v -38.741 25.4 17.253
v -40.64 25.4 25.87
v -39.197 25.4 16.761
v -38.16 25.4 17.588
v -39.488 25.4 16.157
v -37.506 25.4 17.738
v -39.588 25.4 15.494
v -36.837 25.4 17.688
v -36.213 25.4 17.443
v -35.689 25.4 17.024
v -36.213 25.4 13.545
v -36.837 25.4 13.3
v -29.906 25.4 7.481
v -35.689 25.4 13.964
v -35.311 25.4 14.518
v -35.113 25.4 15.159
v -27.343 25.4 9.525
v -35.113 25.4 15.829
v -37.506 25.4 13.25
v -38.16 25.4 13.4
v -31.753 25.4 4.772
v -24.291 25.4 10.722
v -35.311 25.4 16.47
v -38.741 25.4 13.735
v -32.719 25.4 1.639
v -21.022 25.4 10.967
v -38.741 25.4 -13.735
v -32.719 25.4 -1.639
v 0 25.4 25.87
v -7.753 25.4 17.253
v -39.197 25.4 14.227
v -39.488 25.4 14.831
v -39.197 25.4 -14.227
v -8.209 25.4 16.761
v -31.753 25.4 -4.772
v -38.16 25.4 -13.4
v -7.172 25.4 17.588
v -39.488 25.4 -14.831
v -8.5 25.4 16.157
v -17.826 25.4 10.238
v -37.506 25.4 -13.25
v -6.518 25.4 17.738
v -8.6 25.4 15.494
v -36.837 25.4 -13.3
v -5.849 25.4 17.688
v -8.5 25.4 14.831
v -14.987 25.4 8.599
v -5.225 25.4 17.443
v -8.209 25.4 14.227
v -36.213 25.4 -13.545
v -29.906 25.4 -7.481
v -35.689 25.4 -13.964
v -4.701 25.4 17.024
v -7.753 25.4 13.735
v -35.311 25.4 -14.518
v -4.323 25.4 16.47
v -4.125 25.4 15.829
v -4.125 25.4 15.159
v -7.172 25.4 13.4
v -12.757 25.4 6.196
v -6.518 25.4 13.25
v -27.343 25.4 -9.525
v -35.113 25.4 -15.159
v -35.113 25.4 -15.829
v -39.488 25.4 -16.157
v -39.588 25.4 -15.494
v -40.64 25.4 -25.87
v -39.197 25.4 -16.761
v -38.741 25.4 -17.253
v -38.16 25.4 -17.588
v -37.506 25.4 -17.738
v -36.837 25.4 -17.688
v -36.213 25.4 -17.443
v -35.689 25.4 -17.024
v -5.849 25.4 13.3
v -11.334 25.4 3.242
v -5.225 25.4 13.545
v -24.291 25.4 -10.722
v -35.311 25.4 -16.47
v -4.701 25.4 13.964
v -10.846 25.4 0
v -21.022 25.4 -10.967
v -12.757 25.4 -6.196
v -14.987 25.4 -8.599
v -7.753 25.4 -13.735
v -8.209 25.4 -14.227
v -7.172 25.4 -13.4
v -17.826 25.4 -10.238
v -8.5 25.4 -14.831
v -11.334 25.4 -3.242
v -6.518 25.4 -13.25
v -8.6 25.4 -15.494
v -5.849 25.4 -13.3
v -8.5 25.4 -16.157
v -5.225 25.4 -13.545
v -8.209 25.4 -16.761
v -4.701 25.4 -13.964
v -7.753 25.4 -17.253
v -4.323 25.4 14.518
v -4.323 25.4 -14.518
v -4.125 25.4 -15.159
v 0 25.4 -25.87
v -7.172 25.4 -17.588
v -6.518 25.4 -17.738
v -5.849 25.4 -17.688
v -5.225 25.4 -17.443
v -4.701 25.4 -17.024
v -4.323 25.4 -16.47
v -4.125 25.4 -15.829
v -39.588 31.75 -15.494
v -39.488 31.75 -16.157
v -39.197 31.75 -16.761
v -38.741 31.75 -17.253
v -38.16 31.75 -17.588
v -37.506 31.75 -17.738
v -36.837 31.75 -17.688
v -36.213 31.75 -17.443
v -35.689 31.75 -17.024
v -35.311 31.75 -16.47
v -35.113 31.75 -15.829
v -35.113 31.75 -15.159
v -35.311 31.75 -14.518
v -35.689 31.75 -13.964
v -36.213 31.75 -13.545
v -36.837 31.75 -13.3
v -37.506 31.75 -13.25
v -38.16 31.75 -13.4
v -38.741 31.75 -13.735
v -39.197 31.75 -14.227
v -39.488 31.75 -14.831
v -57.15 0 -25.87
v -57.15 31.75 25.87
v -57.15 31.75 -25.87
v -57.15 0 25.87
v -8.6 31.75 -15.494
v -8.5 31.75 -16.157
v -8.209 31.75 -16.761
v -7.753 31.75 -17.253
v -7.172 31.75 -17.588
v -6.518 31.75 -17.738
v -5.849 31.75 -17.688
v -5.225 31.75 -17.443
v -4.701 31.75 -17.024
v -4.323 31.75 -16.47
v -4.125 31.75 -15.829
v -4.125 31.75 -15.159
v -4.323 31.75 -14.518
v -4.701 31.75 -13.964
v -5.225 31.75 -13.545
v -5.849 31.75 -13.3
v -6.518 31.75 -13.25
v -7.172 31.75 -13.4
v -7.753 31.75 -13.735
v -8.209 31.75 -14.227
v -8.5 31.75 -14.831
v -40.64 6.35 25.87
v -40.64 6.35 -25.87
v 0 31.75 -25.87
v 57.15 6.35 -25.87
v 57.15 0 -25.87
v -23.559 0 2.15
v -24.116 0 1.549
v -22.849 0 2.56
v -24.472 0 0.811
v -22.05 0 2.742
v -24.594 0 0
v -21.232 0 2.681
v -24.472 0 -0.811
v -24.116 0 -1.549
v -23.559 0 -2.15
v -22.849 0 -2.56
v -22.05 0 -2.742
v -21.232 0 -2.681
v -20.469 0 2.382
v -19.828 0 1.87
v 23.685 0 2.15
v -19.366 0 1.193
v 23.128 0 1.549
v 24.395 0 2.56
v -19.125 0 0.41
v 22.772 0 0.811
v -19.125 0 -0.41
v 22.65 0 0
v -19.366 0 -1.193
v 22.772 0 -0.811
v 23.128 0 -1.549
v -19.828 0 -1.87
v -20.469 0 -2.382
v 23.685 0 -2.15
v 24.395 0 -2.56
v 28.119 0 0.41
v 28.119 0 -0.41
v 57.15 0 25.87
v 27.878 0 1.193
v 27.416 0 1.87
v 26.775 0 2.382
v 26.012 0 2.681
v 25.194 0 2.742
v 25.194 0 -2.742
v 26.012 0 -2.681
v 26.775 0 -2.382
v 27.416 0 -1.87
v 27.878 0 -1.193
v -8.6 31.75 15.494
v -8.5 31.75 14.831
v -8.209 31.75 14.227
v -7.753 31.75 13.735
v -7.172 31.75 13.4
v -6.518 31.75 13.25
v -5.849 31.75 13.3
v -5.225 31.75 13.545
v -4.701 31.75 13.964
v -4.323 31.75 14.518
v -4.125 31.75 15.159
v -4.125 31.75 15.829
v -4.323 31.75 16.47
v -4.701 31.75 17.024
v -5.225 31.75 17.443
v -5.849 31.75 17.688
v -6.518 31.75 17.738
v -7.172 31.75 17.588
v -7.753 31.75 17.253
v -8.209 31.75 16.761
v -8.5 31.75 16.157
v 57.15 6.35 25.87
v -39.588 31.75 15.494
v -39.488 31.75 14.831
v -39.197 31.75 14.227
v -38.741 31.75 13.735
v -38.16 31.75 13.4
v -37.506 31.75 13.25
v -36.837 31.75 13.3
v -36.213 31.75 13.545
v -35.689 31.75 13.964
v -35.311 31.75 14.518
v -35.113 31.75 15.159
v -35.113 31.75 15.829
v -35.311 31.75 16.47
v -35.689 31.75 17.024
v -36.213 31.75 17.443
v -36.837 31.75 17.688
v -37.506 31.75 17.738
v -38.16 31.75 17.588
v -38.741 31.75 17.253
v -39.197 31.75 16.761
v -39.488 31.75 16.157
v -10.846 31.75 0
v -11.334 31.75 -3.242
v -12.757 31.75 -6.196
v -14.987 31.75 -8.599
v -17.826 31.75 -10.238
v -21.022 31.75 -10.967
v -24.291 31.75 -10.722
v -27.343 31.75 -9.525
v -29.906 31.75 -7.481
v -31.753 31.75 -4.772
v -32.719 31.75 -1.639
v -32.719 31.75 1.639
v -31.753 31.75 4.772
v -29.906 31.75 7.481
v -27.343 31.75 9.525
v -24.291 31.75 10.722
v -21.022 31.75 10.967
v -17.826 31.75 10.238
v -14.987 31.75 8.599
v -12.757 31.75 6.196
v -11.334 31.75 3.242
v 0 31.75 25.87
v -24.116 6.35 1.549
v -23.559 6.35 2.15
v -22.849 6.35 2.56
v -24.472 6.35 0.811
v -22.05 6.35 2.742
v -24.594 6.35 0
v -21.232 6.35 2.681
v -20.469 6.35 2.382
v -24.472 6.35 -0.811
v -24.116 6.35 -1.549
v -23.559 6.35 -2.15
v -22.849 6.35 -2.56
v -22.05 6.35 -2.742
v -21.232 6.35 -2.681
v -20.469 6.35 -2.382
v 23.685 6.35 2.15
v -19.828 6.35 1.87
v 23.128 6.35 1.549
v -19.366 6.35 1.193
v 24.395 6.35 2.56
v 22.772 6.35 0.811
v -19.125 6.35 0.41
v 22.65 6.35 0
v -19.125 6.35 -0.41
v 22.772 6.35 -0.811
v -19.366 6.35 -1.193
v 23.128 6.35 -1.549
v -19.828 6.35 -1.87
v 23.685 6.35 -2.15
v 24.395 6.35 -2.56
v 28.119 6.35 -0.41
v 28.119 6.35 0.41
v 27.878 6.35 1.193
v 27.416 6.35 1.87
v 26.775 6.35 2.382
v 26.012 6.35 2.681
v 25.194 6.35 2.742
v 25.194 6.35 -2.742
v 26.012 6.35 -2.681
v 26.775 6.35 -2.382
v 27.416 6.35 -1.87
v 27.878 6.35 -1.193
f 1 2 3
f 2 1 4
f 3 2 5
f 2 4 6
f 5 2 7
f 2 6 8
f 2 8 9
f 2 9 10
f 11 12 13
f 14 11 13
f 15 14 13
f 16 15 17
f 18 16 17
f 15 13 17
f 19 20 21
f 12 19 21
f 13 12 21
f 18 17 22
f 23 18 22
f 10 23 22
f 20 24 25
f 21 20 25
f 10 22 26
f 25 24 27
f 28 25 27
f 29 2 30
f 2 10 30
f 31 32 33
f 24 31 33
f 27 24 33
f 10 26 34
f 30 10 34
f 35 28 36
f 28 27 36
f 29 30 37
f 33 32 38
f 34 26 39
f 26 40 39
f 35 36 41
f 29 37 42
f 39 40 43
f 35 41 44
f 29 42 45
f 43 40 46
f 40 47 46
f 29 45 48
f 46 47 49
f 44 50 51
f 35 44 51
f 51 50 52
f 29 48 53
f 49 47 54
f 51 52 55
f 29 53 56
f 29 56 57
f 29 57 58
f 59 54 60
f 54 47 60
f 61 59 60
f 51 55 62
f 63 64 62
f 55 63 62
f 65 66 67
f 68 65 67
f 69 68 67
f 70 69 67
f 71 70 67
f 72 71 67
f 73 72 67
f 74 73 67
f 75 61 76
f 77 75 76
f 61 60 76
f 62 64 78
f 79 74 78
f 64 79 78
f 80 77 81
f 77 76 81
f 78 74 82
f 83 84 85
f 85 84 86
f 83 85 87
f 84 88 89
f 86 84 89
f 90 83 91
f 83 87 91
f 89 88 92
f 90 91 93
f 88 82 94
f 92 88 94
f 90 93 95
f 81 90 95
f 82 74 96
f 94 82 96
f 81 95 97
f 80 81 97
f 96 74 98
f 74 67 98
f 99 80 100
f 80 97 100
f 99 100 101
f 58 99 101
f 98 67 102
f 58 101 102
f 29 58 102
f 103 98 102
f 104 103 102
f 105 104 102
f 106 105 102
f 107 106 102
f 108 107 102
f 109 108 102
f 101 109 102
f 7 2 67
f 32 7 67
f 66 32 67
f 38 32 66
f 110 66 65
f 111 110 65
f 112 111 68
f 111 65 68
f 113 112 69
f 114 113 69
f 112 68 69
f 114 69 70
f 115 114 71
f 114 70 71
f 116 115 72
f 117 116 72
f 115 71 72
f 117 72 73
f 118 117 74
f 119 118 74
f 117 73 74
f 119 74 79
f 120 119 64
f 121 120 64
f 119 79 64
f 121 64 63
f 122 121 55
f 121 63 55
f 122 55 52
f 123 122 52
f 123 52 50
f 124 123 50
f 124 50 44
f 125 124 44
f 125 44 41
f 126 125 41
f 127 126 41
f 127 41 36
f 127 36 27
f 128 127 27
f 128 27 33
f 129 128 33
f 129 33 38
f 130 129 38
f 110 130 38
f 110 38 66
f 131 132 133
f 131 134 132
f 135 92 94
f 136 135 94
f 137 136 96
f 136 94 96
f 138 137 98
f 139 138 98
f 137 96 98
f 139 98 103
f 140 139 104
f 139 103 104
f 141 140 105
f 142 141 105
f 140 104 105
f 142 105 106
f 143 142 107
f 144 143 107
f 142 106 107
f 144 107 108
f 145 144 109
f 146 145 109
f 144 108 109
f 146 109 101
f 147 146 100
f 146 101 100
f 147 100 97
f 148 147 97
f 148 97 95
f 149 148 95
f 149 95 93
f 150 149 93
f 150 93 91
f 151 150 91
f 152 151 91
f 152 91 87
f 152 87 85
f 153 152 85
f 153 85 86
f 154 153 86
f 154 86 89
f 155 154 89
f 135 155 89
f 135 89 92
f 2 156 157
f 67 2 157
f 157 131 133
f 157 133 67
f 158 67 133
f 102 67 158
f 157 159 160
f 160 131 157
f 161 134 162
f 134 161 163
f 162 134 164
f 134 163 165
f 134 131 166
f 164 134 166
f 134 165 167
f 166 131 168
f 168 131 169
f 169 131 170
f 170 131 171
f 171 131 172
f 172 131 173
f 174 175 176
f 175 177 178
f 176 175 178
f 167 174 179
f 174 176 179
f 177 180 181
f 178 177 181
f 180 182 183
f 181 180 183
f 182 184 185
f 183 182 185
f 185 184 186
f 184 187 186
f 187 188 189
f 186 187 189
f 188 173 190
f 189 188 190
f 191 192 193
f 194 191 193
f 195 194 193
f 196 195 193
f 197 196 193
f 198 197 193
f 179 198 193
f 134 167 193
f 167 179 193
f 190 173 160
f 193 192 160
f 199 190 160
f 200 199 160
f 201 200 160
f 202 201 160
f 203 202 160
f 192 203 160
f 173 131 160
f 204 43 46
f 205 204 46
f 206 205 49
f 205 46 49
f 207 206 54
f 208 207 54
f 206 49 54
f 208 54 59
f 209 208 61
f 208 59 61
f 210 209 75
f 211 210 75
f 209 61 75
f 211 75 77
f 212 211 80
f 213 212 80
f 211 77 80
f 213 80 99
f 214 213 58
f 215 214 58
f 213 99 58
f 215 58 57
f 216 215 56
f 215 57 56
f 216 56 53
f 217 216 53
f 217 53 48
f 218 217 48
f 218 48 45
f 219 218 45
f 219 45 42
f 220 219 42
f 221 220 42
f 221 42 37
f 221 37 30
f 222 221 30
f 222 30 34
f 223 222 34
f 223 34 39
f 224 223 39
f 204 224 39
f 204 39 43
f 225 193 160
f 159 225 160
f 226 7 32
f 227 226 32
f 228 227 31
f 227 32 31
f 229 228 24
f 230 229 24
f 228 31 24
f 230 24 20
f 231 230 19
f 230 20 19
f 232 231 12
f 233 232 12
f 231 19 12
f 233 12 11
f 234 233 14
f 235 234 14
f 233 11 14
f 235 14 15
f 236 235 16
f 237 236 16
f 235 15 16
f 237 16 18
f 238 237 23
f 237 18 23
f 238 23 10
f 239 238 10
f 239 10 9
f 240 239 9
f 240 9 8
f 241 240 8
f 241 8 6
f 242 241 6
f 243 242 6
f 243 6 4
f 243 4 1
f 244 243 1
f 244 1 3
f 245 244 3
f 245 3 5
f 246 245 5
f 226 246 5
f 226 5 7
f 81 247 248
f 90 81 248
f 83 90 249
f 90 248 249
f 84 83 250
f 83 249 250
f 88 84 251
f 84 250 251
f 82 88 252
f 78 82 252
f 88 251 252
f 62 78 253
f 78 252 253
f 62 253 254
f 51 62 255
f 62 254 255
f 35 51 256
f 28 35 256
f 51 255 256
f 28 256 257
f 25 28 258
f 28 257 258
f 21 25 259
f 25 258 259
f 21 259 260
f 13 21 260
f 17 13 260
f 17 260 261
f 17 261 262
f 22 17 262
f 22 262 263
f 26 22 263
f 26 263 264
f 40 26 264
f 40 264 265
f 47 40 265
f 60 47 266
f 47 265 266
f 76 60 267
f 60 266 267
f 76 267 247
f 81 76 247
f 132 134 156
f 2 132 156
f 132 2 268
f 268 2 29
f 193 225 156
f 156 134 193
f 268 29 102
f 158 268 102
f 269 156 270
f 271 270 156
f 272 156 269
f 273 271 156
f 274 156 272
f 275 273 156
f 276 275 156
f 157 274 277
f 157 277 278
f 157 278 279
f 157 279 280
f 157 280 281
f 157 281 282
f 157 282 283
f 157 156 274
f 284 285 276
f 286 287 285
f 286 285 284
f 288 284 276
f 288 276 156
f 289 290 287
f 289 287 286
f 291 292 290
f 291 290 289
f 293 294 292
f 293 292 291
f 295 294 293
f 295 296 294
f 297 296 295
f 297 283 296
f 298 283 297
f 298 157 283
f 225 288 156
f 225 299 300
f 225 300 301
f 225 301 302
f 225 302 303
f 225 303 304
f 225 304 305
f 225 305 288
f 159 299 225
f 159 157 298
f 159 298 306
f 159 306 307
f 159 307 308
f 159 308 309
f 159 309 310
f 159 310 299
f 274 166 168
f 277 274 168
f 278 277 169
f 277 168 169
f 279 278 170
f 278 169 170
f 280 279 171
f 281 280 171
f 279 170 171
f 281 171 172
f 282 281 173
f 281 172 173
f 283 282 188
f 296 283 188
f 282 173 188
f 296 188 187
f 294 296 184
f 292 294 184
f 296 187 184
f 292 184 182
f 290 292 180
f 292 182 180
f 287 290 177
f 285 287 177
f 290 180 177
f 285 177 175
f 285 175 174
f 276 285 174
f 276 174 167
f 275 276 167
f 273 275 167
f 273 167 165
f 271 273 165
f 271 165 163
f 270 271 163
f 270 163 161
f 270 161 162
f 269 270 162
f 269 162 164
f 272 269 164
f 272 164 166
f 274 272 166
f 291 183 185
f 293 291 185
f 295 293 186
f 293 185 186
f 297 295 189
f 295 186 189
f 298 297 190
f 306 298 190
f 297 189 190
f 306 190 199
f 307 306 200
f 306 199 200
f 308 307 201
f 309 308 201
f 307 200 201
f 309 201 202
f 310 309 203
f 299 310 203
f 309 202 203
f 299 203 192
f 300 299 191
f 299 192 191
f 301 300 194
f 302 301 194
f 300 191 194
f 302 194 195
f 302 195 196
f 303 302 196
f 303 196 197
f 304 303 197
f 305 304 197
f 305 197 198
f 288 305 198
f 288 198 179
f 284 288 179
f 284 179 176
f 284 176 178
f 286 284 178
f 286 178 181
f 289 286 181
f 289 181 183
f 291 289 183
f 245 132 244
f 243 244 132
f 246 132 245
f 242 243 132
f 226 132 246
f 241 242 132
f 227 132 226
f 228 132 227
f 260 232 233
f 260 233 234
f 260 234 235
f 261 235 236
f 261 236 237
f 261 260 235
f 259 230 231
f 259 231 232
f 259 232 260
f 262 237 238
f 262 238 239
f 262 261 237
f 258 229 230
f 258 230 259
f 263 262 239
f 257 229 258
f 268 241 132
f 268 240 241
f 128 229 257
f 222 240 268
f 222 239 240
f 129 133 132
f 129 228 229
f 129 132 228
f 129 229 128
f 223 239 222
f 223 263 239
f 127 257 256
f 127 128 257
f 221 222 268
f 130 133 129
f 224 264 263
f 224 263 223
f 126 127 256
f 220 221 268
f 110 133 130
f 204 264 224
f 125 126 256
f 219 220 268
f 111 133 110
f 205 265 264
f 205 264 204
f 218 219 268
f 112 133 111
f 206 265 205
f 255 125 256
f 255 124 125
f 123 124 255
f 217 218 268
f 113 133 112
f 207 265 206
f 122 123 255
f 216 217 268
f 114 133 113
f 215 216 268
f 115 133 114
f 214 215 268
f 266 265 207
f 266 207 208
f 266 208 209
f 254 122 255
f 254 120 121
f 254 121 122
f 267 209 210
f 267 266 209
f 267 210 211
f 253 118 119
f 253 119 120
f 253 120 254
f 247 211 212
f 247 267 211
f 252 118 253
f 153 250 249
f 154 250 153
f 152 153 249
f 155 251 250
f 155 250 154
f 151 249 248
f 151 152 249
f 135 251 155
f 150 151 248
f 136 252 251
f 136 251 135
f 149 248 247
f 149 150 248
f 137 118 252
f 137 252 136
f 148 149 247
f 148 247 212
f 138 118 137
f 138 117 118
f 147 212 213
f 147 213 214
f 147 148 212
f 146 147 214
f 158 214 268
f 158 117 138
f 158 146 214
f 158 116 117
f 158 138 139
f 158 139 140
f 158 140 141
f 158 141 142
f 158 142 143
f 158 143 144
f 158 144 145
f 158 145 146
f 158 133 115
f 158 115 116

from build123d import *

# Parameters (mm, degrees)
SKETCH1_W                = 114.3
SKETCH1_H                = 51.7398
BOSS_EXTRUDE1_DEPTH      = 6.35
M5_CLEARANCE_HOLE1_D     = 5.5
M5_CLEARANCE_HOLE1_DEPTH = 6.35
SKETCH6_W                = 16.51
SKETCH6_H                = 51.7398
BOSS_EXTRUDE2_DEPTH      = 19.05
SKETCH7_W                = 57.15
SKETCH7_H                = 51.7398
BOSS_EXTRUDE3_DEPTH      = 6.35
SKETCH10_R               = 10.9982
CUT_EXTRUDE1_DEPTH       = 6.35
M4_CLEARANCE_HOLE1_D     = 4.5
M4_CLEARANCE_HOLE1_DEPTH = 6.35


with BuildPart() as part:
    # Sketch1 → Boss-Extrude1 (new body)
    with BuildSketch(Plane(origin=(0, 0, 0), x_dir=(1, 0, 0), z_dir=(0, 1, 0))):
        Rectangle(SKETCH1_W, SKETCH1_H)
    extrude(amount=BOSS_EXTRUDE1_DEPTH)

    # M5 Clearance Hole1
    with Locations(Plane(origin=(0, 6.35, 0), x_dir=(1, 0, 0), z_dir=(0, 1, 0))):
        with Locations((25.4, 0), (-21.844, 0)):
            Hole(M5_CLEARANCE_HOLE1_D / 2, depth=M5_CLEARANCE_HOLE1_DEPTH)

    # Sketch6 → Boss-Extrude2 (add)
    with BuildSketch(Plane(origin=(0, 6.35, 0), x_dir=(1, 0, 0), z_dir=(0, 1, 0))):
        with Locations((-48.895, 0)):
            Rectangle(SKETCH6_W, SKETCH6_H)
    extrude(amount=BOSS_EXTRUDE2_DEPTH)

    # Sketch7 → Boss-Extrude3 (add)
    with BuildSketch(Plane(origin=(0, 25.4, 0), x_dir=(1, 0, 0), z_dir=(0, 1, 0))):
        with Locations((-28.575, 0)):
            Rectangle(SKETCH7_W, SKETCH7_H)
    extrude(amount=BOSS_EXTRUDE3_DEPTH)

    # Sketch10 → Cut-Extrude1 (cut)
    with BuildSketch(Plane(origin=(0, 31.75, 0), x_dir=(1, 0, 0), z_dir=(0, 1, 0))):
        with Locations((-21.844, 0)):
            Circle(SKETCH10_R)
    extrude(amount=-CUT_EXTRUDE1_DEPTH, mode=Mode.SUBTRACT)

    # M4 Clearance Hole1
    with Locations(Plane(origin=(0, 31.75, 0), x_dir=(1, 0, 0), z_dir=(0, 1, 0))):
        with Locations((-6.35, 15.494), (-37.338, 15.494), (-37.338, -15.494), (-6.35, -15.494)):
            Hole(M4_CLEARANCE_HOLE1_D / 2, depth=M4_CLEARANCE_HOLE1_DEPTH)


solid = part.part
